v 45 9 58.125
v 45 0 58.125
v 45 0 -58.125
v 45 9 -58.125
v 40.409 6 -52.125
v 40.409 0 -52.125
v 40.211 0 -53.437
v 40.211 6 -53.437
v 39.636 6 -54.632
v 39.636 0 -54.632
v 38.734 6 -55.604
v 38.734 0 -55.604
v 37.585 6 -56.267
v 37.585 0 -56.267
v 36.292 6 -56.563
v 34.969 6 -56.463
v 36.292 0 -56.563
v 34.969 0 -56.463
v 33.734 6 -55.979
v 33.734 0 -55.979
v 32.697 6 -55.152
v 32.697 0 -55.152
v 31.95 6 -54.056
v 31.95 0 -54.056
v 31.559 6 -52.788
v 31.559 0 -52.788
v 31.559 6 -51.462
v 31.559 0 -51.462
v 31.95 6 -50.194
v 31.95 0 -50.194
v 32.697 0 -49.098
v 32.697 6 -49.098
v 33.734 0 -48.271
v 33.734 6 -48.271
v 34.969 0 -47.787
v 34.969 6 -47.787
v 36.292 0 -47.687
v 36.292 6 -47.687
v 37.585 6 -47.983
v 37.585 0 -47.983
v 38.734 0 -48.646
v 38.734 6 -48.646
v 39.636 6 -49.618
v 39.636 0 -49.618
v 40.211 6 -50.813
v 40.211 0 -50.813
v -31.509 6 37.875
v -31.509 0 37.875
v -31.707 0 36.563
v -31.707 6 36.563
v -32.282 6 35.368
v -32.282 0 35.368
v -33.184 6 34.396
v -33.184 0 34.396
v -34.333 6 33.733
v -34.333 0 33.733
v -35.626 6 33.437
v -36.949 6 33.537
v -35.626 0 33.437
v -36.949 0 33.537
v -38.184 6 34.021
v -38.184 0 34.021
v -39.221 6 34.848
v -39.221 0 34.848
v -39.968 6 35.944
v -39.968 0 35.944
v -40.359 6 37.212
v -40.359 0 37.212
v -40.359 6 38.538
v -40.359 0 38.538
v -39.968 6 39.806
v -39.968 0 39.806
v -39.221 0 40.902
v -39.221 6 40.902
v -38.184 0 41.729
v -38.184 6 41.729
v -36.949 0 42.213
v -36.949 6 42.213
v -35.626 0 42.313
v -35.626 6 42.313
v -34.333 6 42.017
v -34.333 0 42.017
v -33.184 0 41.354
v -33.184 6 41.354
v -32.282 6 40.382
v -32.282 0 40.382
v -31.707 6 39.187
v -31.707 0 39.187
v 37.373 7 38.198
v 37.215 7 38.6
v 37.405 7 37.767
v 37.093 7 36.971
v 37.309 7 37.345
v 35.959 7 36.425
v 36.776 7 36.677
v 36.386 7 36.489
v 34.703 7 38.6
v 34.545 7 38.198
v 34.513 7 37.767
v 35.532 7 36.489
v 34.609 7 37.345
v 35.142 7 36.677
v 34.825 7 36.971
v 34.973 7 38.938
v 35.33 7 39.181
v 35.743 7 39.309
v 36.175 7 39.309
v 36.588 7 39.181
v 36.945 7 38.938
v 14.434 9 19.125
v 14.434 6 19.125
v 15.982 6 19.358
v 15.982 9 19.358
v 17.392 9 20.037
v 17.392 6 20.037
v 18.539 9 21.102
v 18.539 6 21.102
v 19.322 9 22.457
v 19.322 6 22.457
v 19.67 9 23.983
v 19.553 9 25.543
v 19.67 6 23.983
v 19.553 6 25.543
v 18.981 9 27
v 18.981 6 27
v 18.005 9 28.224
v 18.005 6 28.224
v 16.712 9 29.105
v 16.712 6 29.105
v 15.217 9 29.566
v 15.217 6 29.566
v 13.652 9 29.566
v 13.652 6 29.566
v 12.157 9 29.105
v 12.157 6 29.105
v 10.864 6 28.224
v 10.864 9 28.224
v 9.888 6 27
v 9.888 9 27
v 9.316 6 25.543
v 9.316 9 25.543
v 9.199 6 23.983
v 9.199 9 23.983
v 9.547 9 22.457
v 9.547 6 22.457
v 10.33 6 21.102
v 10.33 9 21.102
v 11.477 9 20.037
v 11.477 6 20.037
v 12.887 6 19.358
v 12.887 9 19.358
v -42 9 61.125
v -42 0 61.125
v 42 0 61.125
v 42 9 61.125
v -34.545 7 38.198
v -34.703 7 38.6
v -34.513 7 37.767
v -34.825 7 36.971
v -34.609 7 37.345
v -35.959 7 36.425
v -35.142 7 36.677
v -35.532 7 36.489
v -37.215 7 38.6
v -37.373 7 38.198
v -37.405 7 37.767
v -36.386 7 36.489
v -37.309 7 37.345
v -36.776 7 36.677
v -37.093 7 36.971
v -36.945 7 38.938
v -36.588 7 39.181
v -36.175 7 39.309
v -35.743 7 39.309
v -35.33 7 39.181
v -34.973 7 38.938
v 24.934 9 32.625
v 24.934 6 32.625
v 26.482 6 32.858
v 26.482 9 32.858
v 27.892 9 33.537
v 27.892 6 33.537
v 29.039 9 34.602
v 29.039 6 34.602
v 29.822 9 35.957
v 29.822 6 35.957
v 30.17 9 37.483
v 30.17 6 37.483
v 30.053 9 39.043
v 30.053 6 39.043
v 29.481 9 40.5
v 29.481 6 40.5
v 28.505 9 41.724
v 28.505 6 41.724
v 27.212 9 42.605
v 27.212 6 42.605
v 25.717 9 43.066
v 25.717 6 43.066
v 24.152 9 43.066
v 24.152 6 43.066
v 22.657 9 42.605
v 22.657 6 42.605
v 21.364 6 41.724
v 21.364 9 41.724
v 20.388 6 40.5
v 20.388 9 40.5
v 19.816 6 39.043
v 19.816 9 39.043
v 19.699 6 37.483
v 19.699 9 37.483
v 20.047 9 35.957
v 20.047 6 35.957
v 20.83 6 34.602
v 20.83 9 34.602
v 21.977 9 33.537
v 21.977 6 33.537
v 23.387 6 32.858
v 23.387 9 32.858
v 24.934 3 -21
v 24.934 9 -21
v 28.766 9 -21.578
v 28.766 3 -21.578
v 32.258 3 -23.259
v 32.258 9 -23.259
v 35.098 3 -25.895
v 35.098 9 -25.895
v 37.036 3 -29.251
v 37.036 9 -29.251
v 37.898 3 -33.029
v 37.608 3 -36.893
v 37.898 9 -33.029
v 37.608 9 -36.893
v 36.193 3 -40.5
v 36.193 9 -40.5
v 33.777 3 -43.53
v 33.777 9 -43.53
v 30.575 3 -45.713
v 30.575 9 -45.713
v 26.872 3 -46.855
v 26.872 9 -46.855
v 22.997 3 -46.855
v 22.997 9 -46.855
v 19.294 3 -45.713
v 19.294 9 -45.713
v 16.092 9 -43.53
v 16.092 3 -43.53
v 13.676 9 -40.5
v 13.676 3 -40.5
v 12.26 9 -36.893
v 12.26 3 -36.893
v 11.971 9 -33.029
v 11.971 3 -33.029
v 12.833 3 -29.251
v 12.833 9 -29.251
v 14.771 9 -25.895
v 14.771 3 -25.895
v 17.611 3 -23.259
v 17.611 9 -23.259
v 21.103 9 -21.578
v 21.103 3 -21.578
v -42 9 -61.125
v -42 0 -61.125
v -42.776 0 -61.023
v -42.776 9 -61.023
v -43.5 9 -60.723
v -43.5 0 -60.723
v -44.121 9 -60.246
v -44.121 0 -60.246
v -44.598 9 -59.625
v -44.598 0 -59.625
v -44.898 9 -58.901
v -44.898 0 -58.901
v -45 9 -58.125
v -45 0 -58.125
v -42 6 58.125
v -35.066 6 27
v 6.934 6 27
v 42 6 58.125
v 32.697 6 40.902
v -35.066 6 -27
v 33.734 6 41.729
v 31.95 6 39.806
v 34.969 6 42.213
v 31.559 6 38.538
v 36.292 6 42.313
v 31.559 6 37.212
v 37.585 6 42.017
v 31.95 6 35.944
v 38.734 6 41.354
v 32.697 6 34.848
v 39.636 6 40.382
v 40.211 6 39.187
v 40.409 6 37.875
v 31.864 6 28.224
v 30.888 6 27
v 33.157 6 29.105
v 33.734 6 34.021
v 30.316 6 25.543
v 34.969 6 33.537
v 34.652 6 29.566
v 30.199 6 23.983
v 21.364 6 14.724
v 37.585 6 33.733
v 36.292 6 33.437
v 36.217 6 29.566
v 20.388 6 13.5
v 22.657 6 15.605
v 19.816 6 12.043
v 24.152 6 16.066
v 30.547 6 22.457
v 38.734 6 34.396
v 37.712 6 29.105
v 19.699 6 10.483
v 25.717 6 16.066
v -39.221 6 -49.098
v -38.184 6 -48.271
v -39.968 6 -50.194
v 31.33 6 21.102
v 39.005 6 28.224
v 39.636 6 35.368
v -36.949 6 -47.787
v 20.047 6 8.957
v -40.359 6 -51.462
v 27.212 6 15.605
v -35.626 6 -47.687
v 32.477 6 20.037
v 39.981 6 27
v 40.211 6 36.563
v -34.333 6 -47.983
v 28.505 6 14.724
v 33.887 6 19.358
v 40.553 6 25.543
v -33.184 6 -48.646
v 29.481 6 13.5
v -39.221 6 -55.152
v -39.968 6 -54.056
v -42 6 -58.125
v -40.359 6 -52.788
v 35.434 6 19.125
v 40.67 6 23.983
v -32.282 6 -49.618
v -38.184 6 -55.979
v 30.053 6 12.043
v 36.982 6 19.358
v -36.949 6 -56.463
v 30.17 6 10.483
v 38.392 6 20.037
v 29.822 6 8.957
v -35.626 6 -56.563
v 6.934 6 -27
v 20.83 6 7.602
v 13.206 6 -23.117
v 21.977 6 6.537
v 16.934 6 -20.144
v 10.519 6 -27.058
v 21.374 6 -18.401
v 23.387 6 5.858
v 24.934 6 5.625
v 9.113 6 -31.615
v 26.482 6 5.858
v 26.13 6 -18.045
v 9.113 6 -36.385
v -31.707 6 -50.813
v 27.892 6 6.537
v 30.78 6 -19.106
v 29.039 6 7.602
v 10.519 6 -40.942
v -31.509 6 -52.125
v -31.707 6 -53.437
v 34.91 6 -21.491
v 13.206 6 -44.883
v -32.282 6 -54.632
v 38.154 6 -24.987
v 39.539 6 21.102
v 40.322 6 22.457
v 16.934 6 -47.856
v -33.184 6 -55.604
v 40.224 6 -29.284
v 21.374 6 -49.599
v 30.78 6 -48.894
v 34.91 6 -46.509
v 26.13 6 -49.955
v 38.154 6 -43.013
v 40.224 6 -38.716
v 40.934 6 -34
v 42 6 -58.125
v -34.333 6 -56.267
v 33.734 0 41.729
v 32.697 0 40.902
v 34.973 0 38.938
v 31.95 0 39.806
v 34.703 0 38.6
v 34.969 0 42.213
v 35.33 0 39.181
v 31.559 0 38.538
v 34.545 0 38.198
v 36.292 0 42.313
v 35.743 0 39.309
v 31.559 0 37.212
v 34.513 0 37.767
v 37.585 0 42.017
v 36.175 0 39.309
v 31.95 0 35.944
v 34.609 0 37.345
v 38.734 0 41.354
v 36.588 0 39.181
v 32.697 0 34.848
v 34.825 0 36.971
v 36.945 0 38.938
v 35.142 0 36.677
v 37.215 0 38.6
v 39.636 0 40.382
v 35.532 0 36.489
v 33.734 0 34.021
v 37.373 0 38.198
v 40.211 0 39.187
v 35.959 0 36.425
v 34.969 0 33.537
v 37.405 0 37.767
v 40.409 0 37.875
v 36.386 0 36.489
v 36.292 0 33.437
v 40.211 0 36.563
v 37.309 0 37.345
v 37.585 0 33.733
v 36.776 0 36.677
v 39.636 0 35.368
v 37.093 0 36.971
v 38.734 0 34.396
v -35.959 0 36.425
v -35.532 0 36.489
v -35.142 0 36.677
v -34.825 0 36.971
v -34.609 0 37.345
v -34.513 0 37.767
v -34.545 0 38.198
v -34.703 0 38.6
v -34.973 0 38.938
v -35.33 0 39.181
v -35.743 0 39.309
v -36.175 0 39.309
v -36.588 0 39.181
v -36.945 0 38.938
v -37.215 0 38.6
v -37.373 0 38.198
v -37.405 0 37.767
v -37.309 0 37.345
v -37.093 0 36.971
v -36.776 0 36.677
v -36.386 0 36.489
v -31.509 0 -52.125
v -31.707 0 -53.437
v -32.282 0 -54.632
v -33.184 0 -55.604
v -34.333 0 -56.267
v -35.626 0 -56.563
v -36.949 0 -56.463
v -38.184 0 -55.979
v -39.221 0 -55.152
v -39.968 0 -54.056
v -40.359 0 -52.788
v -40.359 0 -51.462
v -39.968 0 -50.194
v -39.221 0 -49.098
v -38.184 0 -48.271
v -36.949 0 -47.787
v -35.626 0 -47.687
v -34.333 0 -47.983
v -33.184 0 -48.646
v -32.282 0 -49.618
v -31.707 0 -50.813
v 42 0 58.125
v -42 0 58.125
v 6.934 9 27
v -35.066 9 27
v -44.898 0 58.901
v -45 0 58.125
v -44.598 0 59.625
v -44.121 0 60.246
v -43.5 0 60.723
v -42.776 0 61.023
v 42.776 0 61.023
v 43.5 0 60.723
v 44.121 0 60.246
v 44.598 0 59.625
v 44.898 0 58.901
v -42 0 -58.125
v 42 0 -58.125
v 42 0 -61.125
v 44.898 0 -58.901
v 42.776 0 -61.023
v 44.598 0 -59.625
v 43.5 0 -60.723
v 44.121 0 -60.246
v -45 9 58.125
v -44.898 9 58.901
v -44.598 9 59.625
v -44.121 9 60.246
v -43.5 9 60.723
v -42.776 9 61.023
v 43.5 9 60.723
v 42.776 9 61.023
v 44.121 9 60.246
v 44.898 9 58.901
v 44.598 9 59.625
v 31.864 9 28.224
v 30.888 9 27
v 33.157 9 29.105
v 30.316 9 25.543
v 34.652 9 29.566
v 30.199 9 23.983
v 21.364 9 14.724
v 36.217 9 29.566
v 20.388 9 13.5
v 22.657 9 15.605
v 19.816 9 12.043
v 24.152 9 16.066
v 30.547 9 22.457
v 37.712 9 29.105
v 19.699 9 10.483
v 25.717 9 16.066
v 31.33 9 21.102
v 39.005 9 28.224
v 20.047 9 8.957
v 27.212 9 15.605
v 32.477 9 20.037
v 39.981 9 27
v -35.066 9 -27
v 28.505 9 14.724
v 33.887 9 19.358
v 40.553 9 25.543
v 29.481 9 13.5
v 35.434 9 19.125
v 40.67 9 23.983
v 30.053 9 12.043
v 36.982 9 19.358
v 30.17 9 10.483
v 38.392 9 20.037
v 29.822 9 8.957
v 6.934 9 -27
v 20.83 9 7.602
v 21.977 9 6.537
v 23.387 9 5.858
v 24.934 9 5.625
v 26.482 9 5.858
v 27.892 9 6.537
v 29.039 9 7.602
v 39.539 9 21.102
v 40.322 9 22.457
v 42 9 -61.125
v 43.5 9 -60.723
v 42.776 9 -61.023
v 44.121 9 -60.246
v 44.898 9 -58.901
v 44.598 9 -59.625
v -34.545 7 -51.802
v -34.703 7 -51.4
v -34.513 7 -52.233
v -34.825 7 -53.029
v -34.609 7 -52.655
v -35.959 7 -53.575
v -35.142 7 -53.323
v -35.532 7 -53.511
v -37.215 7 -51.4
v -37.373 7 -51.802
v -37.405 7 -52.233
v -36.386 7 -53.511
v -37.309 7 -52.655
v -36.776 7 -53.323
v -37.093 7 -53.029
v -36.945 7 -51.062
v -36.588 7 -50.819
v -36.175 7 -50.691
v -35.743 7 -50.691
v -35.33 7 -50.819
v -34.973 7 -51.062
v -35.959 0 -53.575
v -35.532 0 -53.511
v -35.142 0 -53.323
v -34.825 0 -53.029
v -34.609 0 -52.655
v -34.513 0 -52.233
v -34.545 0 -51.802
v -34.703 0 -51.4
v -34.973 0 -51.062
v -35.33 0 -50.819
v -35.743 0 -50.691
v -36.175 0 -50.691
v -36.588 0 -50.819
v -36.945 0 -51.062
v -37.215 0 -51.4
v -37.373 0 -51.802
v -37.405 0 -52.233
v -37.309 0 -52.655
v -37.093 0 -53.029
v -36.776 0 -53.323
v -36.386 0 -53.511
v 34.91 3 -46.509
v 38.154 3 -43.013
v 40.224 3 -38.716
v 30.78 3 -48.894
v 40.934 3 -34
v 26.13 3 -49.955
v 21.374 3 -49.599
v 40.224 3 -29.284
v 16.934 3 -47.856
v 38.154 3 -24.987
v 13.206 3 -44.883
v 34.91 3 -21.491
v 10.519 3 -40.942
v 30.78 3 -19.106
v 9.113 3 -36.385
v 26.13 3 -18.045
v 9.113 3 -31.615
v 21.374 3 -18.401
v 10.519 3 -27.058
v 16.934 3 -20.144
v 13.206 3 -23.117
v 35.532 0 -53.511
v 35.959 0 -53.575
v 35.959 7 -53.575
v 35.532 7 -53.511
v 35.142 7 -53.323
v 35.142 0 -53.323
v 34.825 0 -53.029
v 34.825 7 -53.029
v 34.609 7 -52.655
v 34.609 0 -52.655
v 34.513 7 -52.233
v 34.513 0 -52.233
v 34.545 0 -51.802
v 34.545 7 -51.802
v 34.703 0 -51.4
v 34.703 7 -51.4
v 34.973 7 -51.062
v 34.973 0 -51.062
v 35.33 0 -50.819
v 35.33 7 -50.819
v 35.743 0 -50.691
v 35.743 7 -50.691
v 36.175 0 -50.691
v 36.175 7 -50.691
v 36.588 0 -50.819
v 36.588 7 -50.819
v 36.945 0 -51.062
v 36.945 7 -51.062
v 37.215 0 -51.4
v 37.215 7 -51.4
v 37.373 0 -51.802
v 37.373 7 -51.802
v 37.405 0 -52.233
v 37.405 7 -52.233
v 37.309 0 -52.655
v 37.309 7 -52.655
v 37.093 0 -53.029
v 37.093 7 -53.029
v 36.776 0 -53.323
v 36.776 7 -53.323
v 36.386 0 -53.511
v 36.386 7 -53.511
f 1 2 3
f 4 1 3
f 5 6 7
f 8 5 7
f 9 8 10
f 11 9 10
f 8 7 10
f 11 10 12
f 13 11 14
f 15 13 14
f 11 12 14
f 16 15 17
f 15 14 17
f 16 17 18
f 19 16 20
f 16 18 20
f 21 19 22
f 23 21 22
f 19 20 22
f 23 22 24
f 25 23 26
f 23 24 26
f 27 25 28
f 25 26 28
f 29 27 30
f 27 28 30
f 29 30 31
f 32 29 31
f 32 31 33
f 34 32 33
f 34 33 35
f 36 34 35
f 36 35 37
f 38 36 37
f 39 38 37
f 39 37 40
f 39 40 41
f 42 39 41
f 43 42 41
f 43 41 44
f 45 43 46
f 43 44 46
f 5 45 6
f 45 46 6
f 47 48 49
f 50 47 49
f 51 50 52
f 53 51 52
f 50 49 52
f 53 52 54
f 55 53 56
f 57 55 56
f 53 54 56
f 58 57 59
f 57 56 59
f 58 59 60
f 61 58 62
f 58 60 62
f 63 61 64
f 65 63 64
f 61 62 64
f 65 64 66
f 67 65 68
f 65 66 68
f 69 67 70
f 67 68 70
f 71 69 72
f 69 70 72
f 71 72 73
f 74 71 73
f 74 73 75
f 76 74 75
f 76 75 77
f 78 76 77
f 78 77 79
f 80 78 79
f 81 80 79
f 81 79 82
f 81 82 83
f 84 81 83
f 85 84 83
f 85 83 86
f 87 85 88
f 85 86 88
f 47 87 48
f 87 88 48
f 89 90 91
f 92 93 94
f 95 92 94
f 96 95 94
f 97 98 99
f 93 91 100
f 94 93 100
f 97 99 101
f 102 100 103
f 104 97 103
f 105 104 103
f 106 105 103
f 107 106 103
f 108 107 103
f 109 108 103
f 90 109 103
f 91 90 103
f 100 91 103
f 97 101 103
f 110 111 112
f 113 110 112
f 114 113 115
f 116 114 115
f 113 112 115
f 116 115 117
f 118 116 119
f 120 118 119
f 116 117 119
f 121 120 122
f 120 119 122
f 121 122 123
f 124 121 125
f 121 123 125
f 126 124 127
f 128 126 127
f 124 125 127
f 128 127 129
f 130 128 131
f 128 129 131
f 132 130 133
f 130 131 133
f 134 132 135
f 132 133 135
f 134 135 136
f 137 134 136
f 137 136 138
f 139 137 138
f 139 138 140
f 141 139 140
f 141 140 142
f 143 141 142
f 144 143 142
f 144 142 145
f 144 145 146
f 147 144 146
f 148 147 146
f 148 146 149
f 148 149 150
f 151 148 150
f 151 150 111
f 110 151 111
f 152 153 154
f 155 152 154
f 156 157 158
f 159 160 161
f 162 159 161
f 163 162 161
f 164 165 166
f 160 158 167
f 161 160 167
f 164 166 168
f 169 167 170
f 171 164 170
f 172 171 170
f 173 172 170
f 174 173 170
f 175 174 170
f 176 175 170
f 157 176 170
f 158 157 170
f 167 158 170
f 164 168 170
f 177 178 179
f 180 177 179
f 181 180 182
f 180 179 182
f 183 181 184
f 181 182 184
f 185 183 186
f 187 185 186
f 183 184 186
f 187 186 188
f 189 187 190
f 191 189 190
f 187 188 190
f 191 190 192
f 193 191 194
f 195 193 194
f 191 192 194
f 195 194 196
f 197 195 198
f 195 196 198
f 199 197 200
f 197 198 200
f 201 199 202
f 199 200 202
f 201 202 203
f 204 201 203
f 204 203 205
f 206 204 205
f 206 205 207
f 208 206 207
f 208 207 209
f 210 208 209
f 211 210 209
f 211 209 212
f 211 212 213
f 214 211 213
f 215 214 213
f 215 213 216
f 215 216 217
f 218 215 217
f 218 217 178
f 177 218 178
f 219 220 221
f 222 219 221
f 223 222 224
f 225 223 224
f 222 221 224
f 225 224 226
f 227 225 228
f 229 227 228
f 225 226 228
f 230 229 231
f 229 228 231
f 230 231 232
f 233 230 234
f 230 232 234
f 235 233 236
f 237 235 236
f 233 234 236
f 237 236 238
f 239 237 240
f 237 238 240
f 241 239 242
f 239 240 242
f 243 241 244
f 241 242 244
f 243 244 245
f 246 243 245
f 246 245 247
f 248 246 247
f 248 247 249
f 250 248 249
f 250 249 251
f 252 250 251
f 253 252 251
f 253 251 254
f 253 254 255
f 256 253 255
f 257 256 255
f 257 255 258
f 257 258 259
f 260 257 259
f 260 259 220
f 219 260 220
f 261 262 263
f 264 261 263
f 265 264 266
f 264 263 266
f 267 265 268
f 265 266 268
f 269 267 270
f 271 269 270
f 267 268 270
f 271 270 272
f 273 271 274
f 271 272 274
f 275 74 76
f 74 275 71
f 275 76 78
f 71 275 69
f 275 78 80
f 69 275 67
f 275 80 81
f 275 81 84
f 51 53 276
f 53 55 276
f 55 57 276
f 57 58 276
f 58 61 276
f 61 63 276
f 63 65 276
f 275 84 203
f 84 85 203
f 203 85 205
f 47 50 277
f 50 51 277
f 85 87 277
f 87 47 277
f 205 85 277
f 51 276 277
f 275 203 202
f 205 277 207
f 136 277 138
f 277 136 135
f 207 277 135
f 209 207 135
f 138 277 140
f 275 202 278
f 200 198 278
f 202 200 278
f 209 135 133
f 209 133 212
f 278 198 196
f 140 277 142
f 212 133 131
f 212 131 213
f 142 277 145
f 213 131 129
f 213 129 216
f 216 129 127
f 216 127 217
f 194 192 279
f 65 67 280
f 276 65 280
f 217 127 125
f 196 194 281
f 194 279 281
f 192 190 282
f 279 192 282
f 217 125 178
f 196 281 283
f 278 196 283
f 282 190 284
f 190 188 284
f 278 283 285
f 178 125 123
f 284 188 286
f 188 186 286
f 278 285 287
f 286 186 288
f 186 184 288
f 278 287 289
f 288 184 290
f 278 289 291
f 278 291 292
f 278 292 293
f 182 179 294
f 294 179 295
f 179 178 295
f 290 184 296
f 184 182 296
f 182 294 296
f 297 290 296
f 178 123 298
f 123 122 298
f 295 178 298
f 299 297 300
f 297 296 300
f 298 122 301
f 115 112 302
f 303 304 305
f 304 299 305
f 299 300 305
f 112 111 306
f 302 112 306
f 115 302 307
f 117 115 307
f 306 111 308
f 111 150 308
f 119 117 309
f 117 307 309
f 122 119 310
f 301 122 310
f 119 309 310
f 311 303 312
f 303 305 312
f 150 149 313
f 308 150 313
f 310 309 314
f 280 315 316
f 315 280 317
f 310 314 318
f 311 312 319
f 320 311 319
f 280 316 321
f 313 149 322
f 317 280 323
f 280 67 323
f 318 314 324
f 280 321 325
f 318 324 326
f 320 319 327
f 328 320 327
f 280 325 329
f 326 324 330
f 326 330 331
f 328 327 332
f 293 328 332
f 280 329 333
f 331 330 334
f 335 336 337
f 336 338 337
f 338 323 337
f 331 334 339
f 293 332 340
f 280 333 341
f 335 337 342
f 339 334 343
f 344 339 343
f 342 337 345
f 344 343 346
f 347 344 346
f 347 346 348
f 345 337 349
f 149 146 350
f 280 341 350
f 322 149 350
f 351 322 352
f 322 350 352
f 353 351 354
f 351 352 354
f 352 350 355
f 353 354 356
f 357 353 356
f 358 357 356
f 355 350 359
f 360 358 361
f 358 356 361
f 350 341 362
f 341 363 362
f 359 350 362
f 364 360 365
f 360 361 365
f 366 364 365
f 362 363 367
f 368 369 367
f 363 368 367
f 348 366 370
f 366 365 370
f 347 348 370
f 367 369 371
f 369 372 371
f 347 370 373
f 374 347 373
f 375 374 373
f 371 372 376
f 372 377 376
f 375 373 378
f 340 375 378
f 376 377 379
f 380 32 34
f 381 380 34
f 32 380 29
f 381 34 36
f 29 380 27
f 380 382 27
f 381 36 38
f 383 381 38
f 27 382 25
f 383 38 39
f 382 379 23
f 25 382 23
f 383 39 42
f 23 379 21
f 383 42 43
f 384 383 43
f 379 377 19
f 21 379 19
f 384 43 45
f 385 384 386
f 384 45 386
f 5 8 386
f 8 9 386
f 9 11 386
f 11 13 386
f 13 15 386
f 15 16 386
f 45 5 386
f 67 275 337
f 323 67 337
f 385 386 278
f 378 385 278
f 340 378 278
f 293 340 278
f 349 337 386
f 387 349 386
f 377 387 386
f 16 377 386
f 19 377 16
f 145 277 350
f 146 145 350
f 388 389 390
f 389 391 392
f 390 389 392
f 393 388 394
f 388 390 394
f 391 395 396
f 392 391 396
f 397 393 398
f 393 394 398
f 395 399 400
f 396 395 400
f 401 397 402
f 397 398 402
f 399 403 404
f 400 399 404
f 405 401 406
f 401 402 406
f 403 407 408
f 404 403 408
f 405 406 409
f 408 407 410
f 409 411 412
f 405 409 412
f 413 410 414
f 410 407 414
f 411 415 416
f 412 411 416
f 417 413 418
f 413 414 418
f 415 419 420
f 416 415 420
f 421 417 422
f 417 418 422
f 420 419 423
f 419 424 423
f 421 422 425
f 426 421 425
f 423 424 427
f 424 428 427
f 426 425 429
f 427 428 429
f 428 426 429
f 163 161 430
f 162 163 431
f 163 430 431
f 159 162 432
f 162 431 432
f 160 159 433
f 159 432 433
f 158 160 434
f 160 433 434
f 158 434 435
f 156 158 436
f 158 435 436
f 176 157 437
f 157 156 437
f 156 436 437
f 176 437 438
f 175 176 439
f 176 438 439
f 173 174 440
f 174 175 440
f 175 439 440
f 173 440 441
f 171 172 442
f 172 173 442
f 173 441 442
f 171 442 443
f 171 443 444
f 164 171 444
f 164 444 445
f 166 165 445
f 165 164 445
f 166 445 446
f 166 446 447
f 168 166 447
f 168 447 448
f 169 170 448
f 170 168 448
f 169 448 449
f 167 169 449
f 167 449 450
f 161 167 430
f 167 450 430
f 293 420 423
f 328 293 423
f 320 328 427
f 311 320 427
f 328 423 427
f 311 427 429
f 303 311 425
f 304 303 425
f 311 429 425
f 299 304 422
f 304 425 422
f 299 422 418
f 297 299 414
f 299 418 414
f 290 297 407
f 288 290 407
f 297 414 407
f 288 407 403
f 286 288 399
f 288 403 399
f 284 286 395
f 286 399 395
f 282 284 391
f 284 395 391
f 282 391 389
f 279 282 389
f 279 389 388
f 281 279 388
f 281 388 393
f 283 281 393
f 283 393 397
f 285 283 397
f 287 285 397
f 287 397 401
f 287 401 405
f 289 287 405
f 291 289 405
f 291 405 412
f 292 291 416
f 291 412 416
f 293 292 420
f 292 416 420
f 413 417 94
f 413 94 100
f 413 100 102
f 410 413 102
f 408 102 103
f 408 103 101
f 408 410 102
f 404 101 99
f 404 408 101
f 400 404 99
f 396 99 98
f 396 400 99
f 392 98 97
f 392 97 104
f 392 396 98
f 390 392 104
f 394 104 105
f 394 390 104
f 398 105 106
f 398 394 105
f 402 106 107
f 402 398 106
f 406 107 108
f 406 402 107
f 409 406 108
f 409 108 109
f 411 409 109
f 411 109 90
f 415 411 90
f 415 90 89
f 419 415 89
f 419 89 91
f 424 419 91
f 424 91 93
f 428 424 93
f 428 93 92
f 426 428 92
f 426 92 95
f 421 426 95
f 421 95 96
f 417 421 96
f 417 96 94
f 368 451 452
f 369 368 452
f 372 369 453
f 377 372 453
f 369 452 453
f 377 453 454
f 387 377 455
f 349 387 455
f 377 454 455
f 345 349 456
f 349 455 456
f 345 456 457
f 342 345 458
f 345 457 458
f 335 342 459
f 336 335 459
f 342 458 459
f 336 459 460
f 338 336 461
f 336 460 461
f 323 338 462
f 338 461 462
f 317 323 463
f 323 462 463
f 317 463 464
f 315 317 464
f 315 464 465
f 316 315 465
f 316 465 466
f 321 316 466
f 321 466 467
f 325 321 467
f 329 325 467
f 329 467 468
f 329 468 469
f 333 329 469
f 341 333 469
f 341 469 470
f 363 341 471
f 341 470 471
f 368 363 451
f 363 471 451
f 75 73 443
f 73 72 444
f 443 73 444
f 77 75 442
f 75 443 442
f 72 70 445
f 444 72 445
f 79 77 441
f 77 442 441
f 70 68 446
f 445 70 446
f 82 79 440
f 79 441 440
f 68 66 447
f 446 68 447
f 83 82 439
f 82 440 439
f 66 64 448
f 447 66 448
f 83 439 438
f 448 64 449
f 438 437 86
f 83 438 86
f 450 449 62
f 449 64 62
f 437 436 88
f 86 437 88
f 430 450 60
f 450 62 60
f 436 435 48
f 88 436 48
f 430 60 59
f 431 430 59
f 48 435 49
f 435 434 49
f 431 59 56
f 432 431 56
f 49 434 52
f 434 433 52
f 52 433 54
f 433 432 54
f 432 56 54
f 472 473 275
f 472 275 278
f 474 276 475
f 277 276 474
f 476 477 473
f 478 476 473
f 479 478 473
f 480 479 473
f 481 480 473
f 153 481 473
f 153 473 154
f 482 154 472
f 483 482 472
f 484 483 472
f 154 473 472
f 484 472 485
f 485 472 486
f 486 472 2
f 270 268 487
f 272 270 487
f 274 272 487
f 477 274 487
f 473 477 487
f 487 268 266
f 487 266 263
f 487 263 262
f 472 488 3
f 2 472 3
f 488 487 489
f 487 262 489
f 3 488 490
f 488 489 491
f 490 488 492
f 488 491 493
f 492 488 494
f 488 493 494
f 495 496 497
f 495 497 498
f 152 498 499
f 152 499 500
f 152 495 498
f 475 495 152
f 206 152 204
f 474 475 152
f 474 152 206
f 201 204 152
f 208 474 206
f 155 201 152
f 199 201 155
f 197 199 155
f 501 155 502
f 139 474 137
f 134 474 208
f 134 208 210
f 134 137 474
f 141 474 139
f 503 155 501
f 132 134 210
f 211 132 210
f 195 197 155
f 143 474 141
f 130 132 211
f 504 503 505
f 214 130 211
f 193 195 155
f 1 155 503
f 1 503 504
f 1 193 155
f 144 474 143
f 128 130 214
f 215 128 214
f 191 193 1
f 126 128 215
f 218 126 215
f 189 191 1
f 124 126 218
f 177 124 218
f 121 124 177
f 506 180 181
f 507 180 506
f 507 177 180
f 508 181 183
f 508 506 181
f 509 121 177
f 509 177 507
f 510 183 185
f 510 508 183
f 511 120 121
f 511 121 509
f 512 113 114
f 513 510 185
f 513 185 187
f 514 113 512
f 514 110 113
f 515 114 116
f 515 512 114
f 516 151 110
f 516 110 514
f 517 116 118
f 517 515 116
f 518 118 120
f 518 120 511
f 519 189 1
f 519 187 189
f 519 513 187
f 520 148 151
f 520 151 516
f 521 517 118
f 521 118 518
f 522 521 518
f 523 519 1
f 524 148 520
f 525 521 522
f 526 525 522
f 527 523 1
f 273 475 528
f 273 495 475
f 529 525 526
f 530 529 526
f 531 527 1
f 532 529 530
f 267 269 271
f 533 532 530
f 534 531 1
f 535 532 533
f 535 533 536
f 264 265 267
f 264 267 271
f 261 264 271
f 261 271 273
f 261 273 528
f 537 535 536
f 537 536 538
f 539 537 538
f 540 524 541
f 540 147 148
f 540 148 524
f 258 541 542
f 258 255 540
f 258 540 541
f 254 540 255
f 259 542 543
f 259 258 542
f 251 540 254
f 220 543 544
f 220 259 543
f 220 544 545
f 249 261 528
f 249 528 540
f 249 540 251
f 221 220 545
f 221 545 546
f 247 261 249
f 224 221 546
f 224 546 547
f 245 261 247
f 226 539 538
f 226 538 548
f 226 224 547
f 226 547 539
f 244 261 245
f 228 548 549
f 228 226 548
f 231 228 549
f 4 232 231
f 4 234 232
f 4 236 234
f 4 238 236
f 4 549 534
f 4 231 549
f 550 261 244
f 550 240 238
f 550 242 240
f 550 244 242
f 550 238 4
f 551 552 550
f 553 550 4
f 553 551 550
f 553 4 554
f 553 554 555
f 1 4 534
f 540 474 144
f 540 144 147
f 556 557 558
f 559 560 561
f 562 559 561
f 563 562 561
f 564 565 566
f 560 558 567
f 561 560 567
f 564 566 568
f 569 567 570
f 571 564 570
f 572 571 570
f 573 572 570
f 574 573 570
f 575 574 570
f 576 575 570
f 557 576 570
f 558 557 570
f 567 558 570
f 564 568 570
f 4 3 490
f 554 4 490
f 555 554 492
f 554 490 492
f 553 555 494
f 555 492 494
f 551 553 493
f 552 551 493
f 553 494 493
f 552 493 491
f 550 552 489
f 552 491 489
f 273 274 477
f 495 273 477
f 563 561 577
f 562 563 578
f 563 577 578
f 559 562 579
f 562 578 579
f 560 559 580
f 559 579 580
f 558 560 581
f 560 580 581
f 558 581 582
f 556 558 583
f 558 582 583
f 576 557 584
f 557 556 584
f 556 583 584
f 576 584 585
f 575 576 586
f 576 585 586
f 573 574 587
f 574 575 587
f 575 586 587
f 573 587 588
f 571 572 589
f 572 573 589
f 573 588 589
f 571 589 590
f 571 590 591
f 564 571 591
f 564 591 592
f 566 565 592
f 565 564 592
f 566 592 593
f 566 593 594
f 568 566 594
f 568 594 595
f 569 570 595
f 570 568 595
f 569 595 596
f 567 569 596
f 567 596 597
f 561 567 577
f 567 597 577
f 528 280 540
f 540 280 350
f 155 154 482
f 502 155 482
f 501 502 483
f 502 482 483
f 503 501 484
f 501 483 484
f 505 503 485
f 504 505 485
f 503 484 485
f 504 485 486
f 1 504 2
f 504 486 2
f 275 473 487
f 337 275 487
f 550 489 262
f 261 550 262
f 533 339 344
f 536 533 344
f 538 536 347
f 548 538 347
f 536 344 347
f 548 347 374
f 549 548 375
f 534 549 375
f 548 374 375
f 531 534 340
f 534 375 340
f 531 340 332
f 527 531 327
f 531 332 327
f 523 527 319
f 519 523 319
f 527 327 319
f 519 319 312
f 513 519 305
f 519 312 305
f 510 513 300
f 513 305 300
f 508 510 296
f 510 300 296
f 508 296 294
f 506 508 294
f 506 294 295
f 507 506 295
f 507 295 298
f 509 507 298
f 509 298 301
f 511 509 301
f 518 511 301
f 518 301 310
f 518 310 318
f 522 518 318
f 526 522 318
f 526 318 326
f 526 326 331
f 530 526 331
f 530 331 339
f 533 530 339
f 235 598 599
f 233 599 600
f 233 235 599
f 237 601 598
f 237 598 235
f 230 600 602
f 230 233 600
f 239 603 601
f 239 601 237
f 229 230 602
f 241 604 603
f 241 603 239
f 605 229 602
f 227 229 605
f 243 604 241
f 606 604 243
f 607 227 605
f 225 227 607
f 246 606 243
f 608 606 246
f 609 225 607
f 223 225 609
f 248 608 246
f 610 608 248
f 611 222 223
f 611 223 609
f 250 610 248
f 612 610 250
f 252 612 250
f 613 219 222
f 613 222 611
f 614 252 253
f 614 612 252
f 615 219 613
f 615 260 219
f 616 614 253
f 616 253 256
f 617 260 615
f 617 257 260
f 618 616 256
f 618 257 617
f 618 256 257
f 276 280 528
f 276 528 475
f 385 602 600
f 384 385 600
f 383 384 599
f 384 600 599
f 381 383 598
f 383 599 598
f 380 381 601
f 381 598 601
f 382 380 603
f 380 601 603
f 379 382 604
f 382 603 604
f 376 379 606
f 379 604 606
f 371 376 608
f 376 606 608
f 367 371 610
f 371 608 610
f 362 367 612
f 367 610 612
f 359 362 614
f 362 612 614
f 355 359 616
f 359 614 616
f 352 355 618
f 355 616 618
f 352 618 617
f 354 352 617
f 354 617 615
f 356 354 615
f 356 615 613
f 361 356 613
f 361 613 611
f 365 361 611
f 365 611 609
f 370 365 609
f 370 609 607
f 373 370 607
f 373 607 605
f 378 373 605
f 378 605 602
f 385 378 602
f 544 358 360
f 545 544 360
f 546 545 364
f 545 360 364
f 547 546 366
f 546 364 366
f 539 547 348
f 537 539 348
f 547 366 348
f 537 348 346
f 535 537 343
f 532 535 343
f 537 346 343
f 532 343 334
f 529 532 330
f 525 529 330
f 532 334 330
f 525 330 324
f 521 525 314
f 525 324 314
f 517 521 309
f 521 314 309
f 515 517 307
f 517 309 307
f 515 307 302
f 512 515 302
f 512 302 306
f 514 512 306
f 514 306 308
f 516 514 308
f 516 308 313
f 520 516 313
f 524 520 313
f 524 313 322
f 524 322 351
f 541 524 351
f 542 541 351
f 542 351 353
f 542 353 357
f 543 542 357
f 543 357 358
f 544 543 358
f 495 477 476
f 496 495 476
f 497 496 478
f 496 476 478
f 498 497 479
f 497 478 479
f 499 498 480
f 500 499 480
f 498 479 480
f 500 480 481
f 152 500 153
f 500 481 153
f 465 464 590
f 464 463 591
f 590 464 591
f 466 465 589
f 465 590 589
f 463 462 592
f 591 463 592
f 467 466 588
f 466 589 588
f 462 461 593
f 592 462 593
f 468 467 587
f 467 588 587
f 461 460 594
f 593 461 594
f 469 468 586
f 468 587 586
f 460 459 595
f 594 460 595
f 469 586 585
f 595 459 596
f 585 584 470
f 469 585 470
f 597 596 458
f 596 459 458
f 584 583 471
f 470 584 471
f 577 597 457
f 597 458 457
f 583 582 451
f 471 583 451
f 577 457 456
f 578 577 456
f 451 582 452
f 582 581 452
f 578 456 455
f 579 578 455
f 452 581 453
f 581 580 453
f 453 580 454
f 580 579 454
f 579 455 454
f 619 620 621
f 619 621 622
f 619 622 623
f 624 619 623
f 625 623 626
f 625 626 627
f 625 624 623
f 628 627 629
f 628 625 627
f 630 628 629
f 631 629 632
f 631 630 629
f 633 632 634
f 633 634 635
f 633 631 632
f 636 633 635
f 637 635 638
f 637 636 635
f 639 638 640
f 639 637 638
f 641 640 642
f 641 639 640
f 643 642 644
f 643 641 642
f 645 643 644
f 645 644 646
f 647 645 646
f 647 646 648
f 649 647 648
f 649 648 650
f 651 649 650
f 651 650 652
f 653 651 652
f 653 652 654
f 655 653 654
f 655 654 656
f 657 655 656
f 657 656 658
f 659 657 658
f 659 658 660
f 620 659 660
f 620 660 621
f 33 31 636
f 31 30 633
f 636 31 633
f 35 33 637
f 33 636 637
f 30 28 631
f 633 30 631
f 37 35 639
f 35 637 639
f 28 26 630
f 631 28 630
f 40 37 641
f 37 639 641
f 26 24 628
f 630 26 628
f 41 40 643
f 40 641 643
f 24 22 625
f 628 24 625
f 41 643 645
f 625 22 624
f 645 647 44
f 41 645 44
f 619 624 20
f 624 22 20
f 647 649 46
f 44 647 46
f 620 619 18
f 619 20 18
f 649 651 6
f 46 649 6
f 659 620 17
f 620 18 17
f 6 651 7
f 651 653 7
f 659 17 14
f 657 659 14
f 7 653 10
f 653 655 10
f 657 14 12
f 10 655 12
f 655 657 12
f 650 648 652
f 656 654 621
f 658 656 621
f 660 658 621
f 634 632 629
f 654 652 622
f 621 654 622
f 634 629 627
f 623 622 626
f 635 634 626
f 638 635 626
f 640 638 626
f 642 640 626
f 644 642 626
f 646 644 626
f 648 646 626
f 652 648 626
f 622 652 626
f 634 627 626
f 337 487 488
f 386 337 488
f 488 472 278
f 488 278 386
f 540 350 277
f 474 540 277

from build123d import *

# Parameters (mm, degrees)
BOSS_EXTRUDE1_DEPTH = 9
SKETCH2_R           = 1.45
CUT_EXTRUDE1_DEPTH  = 77.43471479
CUT_EXTRUDE2_REACH  = 78.435
SKETCH4_R           = 13
SHELL10_OUTLINE_W   = 84
SHELL10_OUTLINE_H   = 116.25
SHELL10_OUTLINE_R   = 4.45
SHELL10_OUTLINE_R_2 = 16
SHELL10_DEPTH       = 6
SKETCH5_R           = 16
CUT_EXTRUDE3_DEPTH  = 3
CUT_EXTRUDE4_REACH  = 78.14
SKETCH6_R           = 5.25
SKETCH6_W           = 42
SKETCH6_H           = 54
BOSS_EXTRUDE2_START = -2
SKETCH7_R           = 1.45
BOSS_EXTRUDE2_DEPTH = 2


# Read off the part's stored shape, not the designer's step: Shell10
with BuildPart() as part:
    # Sketch1 → Boss-Extrude1 (new body)
    with BuildSketch(Plane(origin=(0, 0, 0), x_dir=(1, 0, 0), z_dir=(0, 1, 0))):
        with BuildLine():
            Line((-42, -61.125), (42, -61.125))
            ThreePointArc((42, -61.125), (44.121320344, -60.246320344), (45, -58.125))
            Line((45, -58.125), (45, 58.125))
            ThreePointArc((45, 58.125), (44.121320344, 60.246320344), (42, 61.125))
            Line((42, 61.125), (-42, 61.125))
            ThreePointArc((-42, 61.125), (-44.121320344, 60.246320344), (-45, 58.125))
            Line((-45, 58.125), (-45, -58.125))
            ThreePointArc((-45, -58.125), (-44.121320344, -60.246320344), (-42, -61.125))
        make_face()
    extrude(amount=BOSS_EXTRUDE1_DEPTH)

    # Sketch2 → Cut-Extrude1 (cut, through all)
    with BuildSketch(Plane.XZ):
        with Locations(Location((-35.959, -52.125, 0), (0, 0, 270))):
            Circle(SKETCH2_R)
        with Locations(Location((-35.959, 37.875, 0), (0, 0, 270))):
            Circle(SKETCH2_R)
    cut_extrude1 = extrude(amount=-CUT_EXTRUDE1_DEPTH, mode=Mode.SUBTRACT)

    # Sketch4 → Cut-Extrude2 (cut, up to next)
    with BuildSketch(Plane(origin=(0, 9, 0), x_dir=(1, 0, 0), z_dir=(0, 1, 0)), mode=Mode.PRIVATE) as cut_extrude2_sk1:
        with Locations(Location((24.934417701, 34, 0), (0, 0, 270))):
            Circle(SKETCH4_R)
    cut_extrude2_tool1 = extrude(cut_extrude2_sk1.sketch, amount=-CUT_EXTRUDE2_REACH, mode=Mode.PRIVATE) & part.part
    add(cut_extrude2_tool1.solids().sort_by_distance((24.934418, 9, -34))[0], mode=Mode.SUBTRACT)

    # Mirror3: Cut-Extrude1 across plane
    add(cut_extrude1.mirror(Plane(origin=(0, 0, 0), x_dir=(0, 0, 1), z_dir=(1, 0, 0))), mode=Mode.SUBTRACT)

    # Shell10 outline → Shell10 (cut)
    with BuildSketch(Plane(origin=(0, 0, 0), x_dir=(1, 0, 0), z_dir=(0, 1, 0))):
        Rectangle(SHELL10_OUTLINE_W, SHELL10_OUTLINE_H)
        with Locations((-35.959, -37.875)):
            Circle(SHELL10_OUTLINE_R, mode=Mode.SUBTRACT)
        with Locations((35.959, -37.875)):
            Circle(SHELL10_OUTLINE_R, mode=Mode.SUBTRACT)
        with Locations((-35.959, 52.125)):
            Circle(SHELL10_OUTLINE_R, mode=Mode.SUBTRACT)
        with Locations((24.934417701, 34)):
            Circle(SHELL10_OUTLINE_R_2, mode=Mode.SUBTRACT)
        with Locations((35.959, 52.125)):
            Circle(SHELL10_OUTLINE_R, mode=Mode.SUBTRACT)
    extrude(amount=SHELL10_DEPTH, mode=Mode.SUBTRACT)

    # Sketch5 → Cut-Extrude3 (cut)
    with BuildSketch(Plane.XZ):
        with Locations(Location((24.934417701, -34, 0), (0, 0, 90))):
            Circle(SKETCH5_R)
    extrude(amount=-CUT_EXTRUDE3_DEPTH, mode=Mode.SUBTRACT)

    # Sketch6 → Cut-Extrude4 (cut, up to next)
    with BuildSketch(Plane.XZ.offset(-6), mode=Mode.PRIVATE) as cut_extrude4_sk1:
        with Locations(Location((35.434417701, 24.375, 0), (0, 0, 270))):
            Circle(SKETCH6_R)
    cut_extrude4_tool1 = extrude(cut_extrude4_sk1.sketch, amount=-CUT_EXTRUDE4_REACH, mode=Mode.PRIVATE) & part.part
    # Sketch6 → Cut-Extrude4 (cut, up to next)
    with BuildSketch(Plane.XZ.offset(-6), mode=Mode.PRIVATE) as cut_extrude4_sk2:
        with Locations(Location((14.434417701, 24.375, 0), (0, 0, 270))):
            Circle(SKETCH6_R)
    cut_extrude4_tool2 = extrude(cut_extrude4_sk2.sketch, amount=-CUT_EXTRUDE4_REACH, mode=Mode.PRIVATE) & part.part
    # Sketch6 → Cut-Extrude4 (cut, up to next)
    with BuildSketch(Plane.XZ.offset(-6), mode=Mode.PRIVATE) as cut_extrude4_sk3:
        with Locations(Location((24.934417701, 10.875, 0), (0, 0, 270))):
            Circle(SKETCH6_R)
    cut_extrude4_tool3 = extrude(cut_extrude4_sk3.sketch, amount=-CUT_EXTRUDE4_REACH, mode=Mode.PRIVATE) & part.part
    # Sketch6 → Cut-Extrude4 (cut, up to next)
    with BuildSketch(Plane.XZ.offset(-6), mode=Mode.PRIVATE) as cut_extrude4_sk4:
        with Locations(Location((24.934417701, 37.875, 0), (0, 0, 270))):
            Circle(SKETCH6_R)
    cut_extrude4_tool4 = extrude(cut_extrude4_sk4.sketch, amount=-CUT_EXTRUDE4_REACH, mode=Mode.PRIVATE) & part.part
    # Sketch6 → Cut-Extrude4 (cut, up to next)
    with BuildSketch(Plane.XZ.offset(-6), mode=Mode.PRIVATE) as cut_extrude4_sk5:
        with Locations((-14.065582299, 0)):
            Rectangle(SKETCH6_W, SKETCH6_H)
    cut_extrude4_tool5 = extrude(cut_extrude4_sk5.sketch, amount=-CUT_EXTRUDE4_REACH, mode=Mode.PRIVATE) & part.part
    add(cut_extrude4_tool1.solids().sort_by_distance((35.434418, 6, 24.375))[0], mode=Mode.SUBTRACT)
    add(cut_extrude4_tool2.solids().sort_by_distance((14.434418, 6, 24.375))[0], mode=Mode.SUBTRACT)
    add(cut_extrude4_tool3.solids().sort_by_distance((24.934418, 6, 10.875))[0], mode=Mode.SUBTRACT)
    add(cut_extrude4_tool4.solids().sort_by_distance((24.934418, 6, 37.875))[0], mode=Mode.SUBTRACT)
    add(cut_extrude4_tool5.solids().sort_by_distance((-14.065582, 6, 0))[0], mode=Mode.SUBTRACT)

    # Sketch7 → Boss-Extrude2 (add)
    with BuildSketch(Plane(origin=(0, 9, 0), x_dir=(1, 0, 0), z_dir=(0, 1, 0)).offset(BOSS_EXTRUDE2_START)):
        with Locations(Location((-35.959, -37.875, 0), (0, 0, 90))):
            Circle(SKETCH7_R)
        with Locations(Location((-35.959, 52.125, 0), (0, 0, 90))):
            Circle(SKETCH7_R)
        with Locations(Location((35.959, 52.125, 0), (0, 0, 90))):
            Circle(SKETCH7_R)
        with Locations(Location((35.959, -37.875, 0), (0, 0, 90))):
            Circle(SKETCH7_R)
    extrude(amount=BOSS_EXTRUDE2_DEPTH)


solid = part.part
